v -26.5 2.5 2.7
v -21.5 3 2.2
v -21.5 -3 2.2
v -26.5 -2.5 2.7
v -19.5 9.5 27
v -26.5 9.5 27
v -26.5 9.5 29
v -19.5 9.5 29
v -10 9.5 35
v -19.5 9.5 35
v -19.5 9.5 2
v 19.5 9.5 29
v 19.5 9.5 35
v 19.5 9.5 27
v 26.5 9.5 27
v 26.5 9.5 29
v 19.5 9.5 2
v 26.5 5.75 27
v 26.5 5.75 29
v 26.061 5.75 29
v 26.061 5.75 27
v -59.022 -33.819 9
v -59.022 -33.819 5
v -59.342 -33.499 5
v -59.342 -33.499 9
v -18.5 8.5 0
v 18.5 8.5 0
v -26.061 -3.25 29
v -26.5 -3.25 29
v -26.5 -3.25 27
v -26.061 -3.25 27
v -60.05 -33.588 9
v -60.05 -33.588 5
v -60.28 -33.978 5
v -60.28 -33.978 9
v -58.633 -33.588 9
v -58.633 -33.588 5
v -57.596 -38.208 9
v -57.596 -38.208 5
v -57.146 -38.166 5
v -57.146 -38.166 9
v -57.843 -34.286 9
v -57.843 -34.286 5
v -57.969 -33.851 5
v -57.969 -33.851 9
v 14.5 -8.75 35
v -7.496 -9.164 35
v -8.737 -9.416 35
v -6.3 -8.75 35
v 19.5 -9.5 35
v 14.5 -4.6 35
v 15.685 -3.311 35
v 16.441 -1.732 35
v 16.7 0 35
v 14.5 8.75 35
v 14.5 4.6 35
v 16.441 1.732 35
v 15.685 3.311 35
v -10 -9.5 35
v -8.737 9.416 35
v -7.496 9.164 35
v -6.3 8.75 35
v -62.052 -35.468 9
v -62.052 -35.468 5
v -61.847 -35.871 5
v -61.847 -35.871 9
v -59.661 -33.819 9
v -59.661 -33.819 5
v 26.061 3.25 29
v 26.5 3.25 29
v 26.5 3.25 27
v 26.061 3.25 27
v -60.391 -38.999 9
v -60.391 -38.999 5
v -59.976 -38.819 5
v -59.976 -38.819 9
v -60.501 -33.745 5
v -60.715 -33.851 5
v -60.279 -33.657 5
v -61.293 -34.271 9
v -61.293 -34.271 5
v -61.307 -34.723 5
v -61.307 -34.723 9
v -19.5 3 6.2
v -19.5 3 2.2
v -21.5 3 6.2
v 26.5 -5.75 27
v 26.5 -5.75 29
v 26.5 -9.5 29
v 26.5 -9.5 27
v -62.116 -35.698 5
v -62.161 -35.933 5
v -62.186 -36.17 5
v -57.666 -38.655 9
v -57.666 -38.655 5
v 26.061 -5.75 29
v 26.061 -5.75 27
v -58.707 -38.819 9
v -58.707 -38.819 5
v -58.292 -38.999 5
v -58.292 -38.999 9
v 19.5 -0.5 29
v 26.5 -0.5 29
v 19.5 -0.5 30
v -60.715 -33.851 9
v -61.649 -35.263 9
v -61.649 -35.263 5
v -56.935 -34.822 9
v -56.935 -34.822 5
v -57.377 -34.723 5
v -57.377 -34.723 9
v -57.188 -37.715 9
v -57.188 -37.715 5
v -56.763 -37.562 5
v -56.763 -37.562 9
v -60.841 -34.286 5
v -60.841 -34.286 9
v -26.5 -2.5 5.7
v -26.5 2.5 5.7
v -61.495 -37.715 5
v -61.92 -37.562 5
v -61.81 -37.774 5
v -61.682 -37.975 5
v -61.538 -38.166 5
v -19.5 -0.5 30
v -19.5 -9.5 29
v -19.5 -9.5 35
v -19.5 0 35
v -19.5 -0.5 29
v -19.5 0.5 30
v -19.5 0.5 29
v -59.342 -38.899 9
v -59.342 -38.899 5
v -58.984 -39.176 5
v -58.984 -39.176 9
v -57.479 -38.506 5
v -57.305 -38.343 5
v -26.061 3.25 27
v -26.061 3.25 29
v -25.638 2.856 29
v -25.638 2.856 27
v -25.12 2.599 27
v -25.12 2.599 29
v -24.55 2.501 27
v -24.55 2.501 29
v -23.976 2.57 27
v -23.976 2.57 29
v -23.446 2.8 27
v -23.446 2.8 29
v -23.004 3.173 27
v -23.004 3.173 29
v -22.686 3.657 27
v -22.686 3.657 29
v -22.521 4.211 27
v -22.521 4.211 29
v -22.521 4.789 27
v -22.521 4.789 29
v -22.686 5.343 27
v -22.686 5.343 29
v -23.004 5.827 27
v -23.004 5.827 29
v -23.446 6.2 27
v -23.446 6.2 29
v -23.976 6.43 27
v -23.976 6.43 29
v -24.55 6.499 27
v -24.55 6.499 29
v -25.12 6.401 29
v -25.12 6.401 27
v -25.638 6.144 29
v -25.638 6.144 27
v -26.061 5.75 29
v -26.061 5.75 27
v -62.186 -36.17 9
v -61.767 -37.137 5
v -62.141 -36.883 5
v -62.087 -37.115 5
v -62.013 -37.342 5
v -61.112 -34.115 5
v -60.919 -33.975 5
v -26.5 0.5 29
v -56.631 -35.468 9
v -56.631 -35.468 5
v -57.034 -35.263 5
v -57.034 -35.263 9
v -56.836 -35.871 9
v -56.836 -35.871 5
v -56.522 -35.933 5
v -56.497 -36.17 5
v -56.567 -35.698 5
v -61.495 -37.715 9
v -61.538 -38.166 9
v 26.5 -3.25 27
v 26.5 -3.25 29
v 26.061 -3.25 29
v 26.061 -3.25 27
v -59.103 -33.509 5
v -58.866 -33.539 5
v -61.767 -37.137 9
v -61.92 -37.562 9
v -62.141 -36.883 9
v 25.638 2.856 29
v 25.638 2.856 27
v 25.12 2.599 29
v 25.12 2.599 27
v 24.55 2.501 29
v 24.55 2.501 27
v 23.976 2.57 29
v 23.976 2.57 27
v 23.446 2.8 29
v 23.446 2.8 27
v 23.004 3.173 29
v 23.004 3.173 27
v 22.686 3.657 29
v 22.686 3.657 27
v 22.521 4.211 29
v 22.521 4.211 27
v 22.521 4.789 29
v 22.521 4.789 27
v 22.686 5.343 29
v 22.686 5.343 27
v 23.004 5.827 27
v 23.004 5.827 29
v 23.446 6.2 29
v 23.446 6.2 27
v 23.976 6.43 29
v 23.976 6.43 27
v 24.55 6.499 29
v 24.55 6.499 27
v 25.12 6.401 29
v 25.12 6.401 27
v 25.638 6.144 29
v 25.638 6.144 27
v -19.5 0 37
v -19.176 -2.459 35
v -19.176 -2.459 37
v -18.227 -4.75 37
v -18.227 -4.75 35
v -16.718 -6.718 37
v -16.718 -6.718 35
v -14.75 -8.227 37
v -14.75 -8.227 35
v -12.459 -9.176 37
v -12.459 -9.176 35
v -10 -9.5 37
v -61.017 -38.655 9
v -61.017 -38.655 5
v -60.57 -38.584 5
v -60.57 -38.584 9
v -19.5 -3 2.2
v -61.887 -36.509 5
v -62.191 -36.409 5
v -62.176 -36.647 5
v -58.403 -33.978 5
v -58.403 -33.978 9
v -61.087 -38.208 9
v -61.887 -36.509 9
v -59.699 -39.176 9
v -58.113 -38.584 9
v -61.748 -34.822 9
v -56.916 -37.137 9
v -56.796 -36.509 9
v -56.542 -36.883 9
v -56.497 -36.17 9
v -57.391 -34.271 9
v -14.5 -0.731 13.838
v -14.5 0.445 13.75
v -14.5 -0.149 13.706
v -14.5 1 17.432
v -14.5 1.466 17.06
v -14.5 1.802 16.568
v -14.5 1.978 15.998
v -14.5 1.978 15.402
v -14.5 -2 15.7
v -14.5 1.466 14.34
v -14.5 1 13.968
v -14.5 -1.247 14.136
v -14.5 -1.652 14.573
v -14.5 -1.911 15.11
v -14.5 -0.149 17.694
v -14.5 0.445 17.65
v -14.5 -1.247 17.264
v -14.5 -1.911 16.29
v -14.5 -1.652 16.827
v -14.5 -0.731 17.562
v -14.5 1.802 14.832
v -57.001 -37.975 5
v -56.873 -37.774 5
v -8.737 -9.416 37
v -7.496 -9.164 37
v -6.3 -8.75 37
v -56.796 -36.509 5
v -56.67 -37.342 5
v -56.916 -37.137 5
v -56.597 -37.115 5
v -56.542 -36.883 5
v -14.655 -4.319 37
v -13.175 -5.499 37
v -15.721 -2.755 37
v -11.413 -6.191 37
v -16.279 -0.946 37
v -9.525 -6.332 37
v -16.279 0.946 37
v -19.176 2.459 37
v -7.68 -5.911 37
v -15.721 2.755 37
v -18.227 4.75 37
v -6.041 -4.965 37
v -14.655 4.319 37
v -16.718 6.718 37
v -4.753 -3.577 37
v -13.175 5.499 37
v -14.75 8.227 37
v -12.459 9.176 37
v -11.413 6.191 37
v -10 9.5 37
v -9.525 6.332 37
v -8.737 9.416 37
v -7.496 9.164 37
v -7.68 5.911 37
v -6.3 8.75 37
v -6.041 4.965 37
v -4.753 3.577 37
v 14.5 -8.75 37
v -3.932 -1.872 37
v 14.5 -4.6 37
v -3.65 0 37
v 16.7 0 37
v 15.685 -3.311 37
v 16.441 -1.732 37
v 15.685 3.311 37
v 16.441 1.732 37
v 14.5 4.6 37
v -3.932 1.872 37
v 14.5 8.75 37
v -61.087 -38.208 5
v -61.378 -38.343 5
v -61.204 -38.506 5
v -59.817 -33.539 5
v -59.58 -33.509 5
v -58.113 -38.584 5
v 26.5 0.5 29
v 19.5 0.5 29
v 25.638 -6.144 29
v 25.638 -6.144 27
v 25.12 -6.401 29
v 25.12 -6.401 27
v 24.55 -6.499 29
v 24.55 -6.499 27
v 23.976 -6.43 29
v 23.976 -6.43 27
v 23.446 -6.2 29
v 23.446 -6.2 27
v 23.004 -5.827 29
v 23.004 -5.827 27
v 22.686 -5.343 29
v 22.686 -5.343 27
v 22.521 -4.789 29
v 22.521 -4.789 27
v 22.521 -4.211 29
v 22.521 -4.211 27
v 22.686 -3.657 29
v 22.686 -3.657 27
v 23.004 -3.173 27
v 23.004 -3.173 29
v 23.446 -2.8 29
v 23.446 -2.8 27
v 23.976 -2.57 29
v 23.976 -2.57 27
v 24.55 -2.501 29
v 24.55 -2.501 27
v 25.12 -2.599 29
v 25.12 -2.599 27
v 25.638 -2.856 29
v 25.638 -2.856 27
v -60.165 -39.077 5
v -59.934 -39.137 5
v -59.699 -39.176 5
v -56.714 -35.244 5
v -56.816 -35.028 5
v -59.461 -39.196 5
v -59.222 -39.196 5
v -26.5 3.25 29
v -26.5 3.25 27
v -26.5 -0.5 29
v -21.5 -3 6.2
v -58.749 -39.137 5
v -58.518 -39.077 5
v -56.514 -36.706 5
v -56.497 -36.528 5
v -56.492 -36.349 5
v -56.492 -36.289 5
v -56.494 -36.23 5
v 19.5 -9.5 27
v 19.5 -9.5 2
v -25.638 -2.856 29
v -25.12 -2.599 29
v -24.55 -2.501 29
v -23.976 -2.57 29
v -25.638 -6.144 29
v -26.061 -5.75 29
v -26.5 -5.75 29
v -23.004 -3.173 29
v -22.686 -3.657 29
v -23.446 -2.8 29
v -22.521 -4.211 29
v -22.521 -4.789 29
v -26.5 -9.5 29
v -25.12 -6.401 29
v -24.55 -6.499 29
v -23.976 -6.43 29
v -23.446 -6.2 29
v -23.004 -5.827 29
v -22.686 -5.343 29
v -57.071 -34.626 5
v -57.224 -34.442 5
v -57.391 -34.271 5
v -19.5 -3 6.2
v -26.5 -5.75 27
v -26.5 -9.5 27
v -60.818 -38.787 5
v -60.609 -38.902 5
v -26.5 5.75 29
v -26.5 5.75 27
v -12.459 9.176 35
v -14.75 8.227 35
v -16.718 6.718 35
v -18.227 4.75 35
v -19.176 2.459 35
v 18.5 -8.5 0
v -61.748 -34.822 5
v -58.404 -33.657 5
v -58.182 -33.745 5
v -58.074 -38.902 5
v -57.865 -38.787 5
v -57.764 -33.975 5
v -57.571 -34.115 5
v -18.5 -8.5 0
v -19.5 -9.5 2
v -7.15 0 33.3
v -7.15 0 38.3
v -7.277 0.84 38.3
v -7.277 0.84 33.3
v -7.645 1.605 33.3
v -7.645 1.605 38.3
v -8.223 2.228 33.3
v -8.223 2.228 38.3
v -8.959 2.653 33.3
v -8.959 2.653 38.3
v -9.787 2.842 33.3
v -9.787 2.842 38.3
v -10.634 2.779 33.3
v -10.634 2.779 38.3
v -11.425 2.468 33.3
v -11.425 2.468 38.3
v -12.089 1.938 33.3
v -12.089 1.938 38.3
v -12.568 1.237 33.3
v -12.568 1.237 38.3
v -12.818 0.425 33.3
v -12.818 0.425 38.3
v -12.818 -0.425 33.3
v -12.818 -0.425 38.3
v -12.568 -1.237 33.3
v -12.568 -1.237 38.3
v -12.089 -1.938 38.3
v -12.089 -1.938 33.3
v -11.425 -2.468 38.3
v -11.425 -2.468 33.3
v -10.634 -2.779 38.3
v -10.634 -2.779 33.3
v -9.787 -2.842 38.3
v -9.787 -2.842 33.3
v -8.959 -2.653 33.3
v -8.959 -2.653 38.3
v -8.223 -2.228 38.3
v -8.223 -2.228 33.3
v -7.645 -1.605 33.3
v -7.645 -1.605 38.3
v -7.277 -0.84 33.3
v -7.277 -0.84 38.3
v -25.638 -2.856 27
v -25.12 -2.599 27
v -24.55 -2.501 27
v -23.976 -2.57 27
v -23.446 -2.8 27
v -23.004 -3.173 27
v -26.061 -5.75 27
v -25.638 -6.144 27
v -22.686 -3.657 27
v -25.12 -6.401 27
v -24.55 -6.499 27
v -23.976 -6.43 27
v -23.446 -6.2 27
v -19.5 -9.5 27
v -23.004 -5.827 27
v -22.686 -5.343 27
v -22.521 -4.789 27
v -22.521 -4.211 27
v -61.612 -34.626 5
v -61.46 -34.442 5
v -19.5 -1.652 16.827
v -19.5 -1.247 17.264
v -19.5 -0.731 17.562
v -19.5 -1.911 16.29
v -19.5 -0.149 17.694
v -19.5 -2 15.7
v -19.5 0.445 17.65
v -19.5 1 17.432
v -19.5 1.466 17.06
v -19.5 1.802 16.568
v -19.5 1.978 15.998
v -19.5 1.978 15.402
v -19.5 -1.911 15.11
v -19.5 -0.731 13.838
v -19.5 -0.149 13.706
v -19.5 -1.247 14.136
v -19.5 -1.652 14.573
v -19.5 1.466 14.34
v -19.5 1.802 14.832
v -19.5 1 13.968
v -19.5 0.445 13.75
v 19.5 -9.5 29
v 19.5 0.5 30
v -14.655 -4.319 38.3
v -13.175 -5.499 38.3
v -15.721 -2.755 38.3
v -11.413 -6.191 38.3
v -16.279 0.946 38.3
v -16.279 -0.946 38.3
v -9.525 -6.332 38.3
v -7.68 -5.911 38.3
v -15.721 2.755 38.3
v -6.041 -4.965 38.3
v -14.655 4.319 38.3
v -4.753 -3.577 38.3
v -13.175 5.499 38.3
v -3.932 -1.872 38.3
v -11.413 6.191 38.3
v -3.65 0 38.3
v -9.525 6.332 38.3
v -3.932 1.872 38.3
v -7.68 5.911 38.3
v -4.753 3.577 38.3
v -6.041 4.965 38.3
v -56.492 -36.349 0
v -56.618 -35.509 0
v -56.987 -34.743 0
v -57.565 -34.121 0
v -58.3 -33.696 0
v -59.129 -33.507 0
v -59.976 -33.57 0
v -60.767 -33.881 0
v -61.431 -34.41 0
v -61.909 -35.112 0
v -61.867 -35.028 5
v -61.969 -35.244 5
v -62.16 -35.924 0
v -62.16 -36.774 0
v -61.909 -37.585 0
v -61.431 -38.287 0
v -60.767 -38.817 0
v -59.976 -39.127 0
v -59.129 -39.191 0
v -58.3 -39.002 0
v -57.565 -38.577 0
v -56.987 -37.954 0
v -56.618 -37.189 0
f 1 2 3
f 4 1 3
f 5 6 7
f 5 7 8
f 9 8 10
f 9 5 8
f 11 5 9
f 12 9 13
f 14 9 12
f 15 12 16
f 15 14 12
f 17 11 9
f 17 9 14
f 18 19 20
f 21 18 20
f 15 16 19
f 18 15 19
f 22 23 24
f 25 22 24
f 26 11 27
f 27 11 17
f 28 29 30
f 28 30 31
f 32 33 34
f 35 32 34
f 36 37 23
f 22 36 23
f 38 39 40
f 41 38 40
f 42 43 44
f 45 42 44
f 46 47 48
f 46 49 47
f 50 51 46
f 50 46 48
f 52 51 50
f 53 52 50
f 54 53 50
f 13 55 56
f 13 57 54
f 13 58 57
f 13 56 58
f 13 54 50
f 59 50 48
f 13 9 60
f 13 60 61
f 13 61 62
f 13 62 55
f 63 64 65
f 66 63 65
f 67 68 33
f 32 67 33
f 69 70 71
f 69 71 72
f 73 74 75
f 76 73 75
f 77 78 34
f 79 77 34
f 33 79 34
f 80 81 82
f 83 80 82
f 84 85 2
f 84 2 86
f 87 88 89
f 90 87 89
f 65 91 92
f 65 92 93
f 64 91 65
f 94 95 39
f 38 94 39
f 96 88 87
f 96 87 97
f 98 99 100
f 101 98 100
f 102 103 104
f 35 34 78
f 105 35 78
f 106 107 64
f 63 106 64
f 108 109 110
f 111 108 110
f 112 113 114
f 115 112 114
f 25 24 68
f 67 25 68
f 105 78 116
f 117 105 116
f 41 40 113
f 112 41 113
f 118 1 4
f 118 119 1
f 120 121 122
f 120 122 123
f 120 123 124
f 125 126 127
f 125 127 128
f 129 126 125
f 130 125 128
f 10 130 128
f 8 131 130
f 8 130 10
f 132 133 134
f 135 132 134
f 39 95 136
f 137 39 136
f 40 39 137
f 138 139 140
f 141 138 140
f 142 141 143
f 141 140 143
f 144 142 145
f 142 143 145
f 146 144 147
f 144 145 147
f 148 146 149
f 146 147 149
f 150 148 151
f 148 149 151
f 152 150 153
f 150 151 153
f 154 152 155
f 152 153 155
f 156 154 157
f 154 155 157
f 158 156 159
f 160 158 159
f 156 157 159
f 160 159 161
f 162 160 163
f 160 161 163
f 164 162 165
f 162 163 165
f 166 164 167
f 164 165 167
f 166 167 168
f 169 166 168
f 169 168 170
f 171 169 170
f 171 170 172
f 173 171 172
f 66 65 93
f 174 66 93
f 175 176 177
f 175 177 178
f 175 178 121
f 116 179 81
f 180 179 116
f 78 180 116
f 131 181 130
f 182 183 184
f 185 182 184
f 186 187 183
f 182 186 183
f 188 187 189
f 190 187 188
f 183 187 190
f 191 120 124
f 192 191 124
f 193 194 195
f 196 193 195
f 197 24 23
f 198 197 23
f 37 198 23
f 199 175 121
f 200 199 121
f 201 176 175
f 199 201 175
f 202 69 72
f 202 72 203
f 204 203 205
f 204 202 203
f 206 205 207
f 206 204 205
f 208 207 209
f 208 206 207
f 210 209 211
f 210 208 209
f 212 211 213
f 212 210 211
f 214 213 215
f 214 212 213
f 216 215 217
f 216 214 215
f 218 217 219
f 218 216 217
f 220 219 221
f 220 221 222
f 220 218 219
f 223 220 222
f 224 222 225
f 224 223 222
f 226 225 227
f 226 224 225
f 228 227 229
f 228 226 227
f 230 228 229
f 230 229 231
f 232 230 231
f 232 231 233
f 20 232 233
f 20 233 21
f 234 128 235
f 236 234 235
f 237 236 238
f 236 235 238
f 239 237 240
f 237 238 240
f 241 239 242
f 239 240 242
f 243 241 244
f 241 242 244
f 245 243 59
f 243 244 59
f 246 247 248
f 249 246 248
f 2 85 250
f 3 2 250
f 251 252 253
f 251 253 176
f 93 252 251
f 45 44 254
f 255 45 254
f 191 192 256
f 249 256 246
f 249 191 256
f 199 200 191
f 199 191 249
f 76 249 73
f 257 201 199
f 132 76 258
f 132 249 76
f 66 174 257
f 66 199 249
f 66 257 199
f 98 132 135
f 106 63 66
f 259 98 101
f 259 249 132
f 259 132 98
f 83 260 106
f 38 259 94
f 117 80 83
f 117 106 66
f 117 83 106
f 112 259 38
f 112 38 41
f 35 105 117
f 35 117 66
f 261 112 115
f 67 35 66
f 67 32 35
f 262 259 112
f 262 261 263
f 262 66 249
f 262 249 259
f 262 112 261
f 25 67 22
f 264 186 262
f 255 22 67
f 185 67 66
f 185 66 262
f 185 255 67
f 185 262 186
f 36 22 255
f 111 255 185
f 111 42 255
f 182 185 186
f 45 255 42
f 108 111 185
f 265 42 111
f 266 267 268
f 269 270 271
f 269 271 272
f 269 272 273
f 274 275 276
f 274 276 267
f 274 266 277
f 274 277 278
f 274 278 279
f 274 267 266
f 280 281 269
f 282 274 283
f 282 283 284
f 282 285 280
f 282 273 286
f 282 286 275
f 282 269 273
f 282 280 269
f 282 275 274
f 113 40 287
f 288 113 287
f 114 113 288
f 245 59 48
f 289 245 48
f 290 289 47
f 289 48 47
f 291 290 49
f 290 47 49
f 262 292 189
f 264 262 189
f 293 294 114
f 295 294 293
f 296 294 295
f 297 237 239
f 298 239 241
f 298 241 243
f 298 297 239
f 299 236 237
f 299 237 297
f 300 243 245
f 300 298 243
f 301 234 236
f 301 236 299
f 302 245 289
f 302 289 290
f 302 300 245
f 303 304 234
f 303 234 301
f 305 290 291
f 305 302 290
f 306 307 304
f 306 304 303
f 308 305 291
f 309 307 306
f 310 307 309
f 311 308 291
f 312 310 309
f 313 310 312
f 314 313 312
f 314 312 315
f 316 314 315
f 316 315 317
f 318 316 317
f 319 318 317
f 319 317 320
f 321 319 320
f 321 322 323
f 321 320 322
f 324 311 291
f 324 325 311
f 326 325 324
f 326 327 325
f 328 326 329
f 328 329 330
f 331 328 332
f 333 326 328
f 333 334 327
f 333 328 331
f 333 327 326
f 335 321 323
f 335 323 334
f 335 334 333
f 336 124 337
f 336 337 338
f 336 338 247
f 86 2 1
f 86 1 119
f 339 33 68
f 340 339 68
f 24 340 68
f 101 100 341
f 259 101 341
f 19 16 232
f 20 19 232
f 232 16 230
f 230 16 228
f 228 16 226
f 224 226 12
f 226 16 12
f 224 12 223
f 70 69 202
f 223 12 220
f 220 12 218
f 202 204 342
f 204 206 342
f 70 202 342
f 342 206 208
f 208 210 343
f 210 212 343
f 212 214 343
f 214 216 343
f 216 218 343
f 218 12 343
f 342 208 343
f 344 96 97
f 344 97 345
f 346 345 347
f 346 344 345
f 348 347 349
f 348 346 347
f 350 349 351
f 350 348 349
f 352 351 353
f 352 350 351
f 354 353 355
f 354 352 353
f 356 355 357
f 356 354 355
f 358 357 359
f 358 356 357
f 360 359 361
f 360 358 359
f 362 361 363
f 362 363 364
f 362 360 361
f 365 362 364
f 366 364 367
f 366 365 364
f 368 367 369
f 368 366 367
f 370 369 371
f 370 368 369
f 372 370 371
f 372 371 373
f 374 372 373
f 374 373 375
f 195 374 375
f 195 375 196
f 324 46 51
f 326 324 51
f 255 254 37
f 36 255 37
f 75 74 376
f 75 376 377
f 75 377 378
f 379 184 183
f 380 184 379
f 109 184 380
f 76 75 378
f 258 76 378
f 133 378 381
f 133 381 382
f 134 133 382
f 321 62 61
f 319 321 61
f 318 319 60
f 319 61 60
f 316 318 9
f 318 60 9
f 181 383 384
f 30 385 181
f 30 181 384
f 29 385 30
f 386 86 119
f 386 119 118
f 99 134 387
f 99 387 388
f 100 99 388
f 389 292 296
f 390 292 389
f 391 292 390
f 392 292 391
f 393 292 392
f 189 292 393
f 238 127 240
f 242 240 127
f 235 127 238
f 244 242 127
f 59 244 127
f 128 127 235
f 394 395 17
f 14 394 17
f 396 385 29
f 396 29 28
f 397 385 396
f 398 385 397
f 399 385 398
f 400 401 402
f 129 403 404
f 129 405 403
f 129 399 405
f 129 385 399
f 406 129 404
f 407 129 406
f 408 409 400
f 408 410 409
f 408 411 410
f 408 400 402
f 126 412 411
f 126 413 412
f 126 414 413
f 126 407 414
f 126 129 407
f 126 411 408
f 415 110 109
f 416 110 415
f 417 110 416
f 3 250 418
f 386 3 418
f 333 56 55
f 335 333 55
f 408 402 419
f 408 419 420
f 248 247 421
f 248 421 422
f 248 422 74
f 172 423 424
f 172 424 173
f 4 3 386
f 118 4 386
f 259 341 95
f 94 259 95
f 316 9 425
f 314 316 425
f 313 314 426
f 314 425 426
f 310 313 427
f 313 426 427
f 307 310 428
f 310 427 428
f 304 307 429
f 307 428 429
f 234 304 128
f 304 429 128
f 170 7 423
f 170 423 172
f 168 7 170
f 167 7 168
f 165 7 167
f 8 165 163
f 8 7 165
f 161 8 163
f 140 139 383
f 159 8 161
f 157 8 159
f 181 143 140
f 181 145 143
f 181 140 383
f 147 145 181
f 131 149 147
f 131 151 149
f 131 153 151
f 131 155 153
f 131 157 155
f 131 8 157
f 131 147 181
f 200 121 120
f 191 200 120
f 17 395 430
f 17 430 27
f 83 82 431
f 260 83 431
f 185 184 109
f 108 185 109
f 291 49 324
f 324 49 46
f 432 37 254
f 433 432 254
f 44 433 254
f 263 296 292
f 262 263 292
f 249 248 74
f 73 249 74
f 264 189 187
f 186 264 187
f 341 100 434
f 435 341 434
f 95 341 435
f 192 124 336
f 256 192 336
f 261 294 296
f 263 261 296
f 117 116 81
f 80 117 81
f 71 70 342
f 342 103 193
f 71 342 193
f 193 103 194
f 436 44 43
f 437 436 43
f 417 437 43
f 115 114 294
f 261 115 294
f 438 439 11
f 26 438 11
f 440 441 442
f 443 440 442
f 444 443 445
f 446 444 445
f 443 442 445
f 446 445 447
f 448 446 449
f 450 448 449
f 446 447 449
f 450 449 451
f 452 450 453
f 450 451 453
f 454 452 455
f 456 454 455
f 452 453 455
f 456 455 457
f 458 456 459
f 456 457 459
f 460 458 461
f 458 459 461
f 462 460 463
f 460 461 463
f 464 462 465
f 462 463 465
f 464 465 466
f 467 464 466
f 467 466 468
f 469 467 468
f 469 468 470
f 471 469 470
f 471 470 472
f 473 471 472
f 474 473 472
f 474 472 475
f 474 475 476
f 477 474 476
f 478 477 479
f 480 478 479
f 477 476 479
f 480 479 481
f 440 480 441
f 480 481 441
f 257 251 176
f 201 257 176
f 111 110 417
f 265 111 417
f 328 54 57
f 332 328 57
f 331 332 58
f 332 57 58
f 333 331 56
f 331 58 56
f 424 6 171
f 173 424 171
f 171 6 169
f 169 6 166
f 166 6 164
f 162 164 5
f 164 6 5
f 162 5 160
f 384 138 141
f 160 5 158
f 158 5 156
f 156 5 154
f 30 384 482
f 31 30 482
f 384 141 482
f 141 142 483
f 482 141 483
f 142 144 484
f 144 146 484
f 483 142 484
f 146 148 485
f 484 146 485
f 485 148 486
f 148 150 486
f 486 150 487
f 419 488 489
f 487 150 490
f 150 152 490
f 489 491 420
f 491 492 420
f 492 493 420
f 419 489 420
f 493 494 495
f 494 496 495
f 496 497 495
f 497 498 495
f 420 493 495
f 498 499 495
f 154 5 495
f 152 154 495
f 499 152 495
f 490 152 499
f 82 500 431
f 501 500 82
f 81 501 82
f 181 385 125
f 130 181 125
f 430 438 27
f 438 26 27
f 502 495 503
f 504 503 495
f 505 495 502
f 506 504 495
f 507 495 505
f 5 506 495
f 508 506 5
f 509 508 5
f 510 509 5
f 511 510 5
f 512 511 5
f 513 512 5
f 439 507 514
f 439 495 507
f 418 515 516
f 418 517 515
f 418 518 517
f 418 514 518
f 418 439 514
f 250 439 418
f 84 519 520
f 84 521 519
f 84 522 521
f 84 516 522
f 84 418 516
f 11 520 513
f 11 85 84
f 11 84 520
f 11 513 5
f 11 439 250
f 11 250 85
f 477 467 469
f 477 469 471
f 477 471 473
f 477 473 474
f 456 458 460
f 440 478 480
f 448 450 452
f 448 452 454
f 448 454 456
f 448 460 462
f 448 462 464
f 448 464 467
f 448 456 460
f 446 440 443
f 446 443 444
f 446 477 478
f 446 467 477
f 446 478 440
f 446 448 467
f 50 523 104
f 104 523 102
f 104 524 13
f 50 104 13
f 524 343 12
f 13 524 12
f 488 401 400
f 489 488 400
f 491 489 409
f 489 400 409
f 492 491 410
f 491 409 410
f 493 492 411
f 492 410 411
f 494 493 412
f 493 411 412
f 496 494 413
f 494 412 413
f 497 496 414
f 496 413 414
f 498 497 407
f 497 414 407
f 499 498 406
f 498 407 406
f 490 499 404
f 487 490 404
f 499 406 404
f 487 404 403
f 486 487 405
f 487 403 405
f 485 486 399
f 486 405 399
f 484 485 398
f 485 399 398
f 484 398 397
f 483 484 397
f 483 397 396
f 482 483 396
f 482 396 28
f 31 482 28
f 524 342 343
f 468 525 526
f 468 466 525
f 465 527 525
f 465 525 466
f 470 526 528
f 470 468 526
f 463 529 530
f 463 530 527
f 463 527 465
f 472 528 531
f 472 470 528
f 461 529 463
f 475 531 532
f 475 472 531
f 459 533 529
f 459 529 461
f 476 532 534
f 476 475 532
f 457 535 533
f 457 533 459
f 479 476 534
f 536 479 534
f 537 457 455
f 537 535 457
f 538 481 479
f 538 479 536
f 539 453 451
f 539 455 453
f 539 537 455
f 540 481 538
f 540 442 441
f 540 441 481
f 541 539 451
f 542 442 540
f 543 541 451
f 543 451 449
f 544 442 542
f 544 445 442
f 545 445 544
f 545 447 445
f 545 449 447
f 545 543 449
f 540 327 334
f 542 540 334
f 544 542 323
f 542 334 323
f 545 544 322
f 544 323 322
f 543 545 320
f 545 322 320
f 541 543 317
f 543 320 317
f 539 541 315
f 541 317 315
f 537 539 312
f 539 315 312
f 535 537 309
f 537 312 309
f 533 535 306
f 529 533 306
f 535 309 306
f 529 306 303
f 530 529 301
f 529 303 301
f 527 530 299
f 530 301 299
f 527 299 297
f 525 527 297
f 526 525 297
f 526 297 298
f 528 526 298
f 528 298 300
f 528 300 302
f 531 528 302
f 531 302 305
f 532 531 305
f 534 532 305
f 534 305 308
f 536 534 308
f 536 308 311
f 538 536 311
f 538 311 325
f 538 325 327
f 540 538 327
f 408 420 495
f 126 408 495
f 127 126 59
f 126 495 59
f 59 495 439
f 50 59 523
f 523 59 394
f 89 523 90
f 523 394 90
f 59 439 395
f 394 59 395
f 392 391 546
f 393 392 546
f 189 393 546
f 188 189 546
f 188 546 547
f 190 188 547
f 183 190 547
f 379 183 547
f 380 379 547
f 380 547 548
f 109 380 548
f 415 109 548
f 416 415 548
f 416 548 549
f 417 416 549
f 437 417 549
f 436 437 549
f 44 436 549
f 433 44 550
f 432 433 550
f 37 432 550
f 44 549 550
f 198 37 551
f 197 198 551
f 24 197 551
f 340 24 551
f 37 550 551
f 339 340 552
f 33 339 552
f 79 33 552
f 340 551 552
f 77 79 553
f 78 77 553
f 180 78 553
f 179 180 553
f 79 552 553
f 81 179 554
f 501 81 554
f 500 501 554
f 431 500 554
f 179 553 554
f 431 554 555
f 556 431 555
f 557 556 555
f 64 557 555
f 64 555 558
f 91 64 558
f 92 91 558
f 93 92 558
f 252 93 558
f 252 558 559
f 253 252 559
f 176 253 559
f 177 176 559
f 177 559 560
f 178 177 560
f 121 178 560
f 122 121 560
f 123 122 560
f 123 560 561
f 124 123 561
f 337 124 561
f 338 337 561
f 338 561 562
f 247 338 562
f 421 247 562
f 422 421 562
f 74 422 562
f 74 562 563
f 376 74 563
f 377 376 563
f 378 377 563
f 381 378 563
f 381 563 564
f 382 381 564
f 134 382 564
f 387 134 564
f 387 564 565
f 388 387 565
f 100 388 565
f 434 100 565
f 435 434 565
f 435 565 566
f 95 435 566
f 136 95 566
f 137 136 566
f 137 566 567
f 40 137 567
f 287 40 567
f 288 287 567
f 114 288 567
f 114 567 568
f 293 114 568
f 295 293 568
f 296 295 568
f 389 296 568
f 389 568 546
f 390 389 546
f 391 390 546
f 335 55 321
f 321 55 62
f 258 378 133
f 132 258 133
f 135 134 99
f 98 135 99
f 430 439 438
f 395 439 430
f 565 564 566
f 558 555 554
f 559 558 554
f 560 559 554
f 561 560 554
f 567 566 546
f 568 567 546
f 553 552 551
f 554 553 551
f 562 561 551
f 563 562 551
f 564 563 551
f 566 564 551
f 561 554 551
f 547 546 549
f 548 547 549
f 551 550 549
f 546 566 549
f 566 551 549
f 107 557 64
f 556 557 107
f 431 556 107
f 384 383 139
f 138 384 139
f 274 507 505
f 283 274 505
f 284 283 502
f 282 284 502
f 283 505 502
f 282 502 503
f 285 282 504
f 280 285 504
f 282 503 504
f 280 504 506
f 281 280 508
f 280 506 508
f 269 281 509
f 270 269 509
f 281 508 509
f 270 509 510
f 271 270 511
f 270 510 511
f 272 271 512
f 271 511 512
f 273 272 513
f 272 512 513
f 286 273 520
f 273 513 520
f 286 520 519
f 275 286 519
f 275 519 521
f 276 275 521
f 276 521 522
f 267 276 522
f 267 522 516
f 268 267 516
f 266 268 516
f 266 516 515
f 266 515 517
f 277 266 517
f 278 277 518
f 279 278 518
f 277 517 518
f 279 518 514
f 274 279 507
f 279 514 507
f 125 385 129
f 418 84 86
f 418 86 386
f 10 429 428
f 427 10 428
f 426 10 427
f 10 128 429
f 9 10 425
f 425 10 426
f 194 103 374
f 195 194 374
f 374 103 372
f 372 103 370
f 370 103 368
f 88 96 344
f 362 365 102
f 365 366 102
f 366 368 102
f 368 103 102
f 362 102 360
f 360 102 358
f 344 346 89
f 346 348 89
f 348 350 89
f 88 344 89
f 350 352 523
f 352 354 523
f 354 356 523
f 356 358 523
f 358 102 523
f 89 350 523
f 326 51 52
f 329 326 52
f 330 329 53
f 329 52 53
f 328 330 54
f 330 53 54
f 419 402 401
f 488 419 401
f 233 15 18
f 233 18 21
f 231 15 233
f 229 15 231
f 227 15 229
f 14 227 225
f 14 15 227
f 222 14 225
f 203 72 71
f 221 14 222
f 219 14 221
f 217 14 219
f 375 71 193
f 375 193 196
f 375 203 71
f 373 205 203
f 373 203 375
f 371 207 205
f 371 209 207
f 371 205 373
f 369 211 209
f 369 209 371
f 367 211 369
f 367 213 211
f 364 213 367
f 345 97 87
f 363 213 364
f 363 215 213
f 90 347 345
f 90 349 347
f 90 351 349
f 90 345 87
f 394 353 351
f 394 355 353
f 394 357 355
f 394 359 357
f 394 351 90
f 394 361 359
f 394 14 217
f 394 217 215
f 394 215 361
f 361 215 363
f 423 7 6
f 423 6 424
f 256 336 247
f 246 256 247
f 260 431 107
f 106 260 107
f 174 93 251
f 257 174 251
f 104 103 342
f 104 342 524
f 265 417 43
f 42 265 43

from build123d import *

# Parameters (mm, degrees)
F0_W      = 39
F0_H      = 19
F1_DEPTH  = 35
F2_W      = 19
F2_H      = 2
F3_DEPTH  = 7
F4_W      = 7
F4_H      = 1
F5_DEPTH  = 1
F7_DEPTH  = 1
F8_SIZE2  = 2
F8_SIZE   = 1
F9_W      = 0.5
F9_H      = 2.5
F9_W_2    = 0.4387505004
F10_DEPTH = 2
F12_W     = 6
F12_H     = 4
F13_DEPTH = 7
F12_R     = 2
F14_DEPTH = 5
F15_SIZE2 = 5
F15_SIZE  = 0.5
F16_R     = 6.35
F17_DEPTH = 2
F18_DEPTH = 3.3
F19_R     = 2.85
F20_DEPTH = 5
F21_R     = 2.85
F22_DEPTH = 5
F24_DEPTH = 4


with BuildPart() as f1:
    # F0 (on Top) → F1 (new body)
    with BuildSketch(Plane.XY):
        Rectangle(F0_W, F0_H)
    extrude(amount=F1_DEPTH)

    # F2 (on face) → F3 (join)
    with BuildSketch(Plane(origin=(-19.5, 0, 0), x_dir=(0, -1, 0), z_dir=(-1, 0, 0))):
        with Locations((0, 28)):
            Rectangle(F2_W, F2_H)
    extrude(amount=F3_DEPTH)

    # F4 (on face) → F5 (join)
    with BuildSketch(Plane.XY.offset(29)):
        with Locations((-23, 0)):
            Rectangle(F4_W, F4_H)
    extrude(amount=F5_DEPTH)

    # F6 (on face) → F7 (cut, through all)
    with BuildSketch(Plane.XZ.offset(0.5)):
        Polygon((-26.5, 30), (-26.5, 29), (-19.5, 30), align=None)
    extrude(amount=-F7_DEPTH, mode=Mode.SUBTRACT)

    # F8
    f8_edges = [f1.edges().sort_by_distance(p)[0] for p in [
        (0, -9.5, 0),
        (19.5, 0, 0),
        (0, 9.5, 0),
        (-19.5, 0, 0),
    ]]
    f8_side = f1.faces().sort_by_distance((0, 0, 0))[0]
    chamfer(f8_edges, length=F8_SIZE, length2=F8_SIZE2, reference=f8_side)

    # F9 (on face) → F10 (cut, through all)
    with BuildSketch(Plane.XY.offset(29)):
        with Locations((-26.3112494996, 4.5)):
            Rectangle(F9_W, F9_H)
        with BuildLine():
            Line((-26.0612494996, 5.75), (-26.0612494996, 3.25))
            ThreePointArc((-26.0612494996, 3.25), (-22.5, 4.5), (-26.0612494996, 5.75))
        make_face()
        with Locations((-26.2806247498, -4.5)):
            Rectangle(F9_W_2, F9_H)
        with BuildLine():
            Line((-26.0612494996, -3.25), (-26.0612494996, -5.75))
            ThreePointArc((-26.0612494996, -5.75), (-22.5, -4.5), (-26.0612494996, -3.25))
        make_face()
    extrude(amount=-F10_DEPTH, mode=Mode.SUBTRACT)

    # F11: F1 across plane


with BuildPart() as f1_1:
    add(f1.part)
    add(f1.part.mirror(Plane.YZ))

    # F12 (on face) → F13 (join)
    with BuildSketch(Plane(origin=(-19.5, 0, 0), x_dir=(0, -1, 0), z_dir=(-1, 0, 0))):
        with Locations((0, 4.2)):
            Rectangle(F12_W, F12_H)
    extrude(amount=F13_DEPTH)

    # F12 (on face) → F14 (cut)
    with BuildSketch(Plane(origin=(-19.5, 0, 0), x_dir=(0, -1, 0), z_dir=(-1, 0, 0))):
        with Locations((0, 15.7)):
            Circle(F12_R)
    extrude(amount=-F14_DEPTH, mode=Mode.SUBTRACT)

    # F15
    f15_edges = [f1_1.edges().sort_by_distance(p)[0] for p in [
        (-26.5, 0, 2.2),
        (-26.5, -3, 4.2),
        (-26.5, 0, 6.2),
        (-26.5, 3, 4.2),
    ]]
    f15_side = f1_1.faces().sort_by_distance((-26.5, 0, 4.2))[0]
    chamfer(f15_edges, length=F15_SIZE, length2=F15_SIZE2, reference=f15_side)

    # F16 (on face) → F17 (join)
    with BuildSketch(Plane.XY.offset(35)):
        with BuildLine():
            ThreePointArc((-6.3003378533, -8.75), (-2.0817681774, -5.2489622596), (-0.5, 0))
            ThreePointArc((-0.5, 0), (-2.0817681774, 5.2489622596), (-6.3003378533, 8.75))
            ThreePointArc((-6.3003378533, 8.75), (-8.1125413912, 9.3106122248), (-10, 9.5))
            ThreePointArc((-10, 9.5), (-16.7175144213, 6.7175144213), (-19.5, 0))
            ThreePointArc((-19.5, 0), (-16.7175144213, -6.7175144213), (-10, -9.5))
            ThreePointArc((-10, -9.5), (-8.1125413912, -9.3106122248), (-6.3003378533, -8.75))
        make_face()
        with Locations((-10, 0)):
            Circle(F16_R, mode=Mode.SUBTRACT)
        with BuildLine():
            ThreePointArc((-6.3003378533, 8.75), (-2.0817681774, 5.2489622596), (-0.5, 0))
            ThreePointArc((-0.5, 0), (-2.0817681774, -5.2489622596), (-6.3003378533, -8.75))
            Line((-6.3003378533, -8.75), (14.5, -8.75))
            Line((14.5, -8.75), (14.5, -4.6))
            ThreePointArc((14.5, -4.6), (4.8818181818, 0), (14.5, 4.6))
            Line((14.5, 4.6), (14.5, 8.75))
            Line((14.5, 8.75), (-6.3003378533, 8.75))
        make_face()
        with BuildLine():
            Line((14.5, -4.6), (14.5, 4.6))
            ThreePointArc((14.5, 4.6), (4.8818181818, 0), (14.5, -4.6))
        make_face()
        with BuildLine():
            ThreePointArc((16.7, 0), (16.1217022188, 2.5495097568), (14.5, 4.6))
            Line((14.5, 4.6), (14.5, -4.6))
            ThreePointArc((14.5, -4.6), (16.1217022188, -2.5495097568), (16.7, 0))
        make_face()
    extrude(amount=F17_DEPTH)

    # F18 (add): a face of the model
    f18_faces = [f1_1.faces().sort_by_distance(p)[0] for p in [
        (-10, 0, 35),
    ]]
    extrude(f18_faces, amount=F18_DEPTH)

    # F19 (on face) → F20 (cut)
    with BuildSketch(Plane.XY.offset(38.3)):
        with Locations((-10, 0)):
            Circle(F19_R)
    extrude(amount=-F20_DEPTH, mode=Mode.SUBTRACT)


with BuildPart() as f22:
    # F21 (on Top) → F22 (new body)
    with BuildSketch(Plane.XY):
        with Locations((-59.341583401, -36.3488905132)):
            Circle(F21_R)
    extrude(amount=F22_DEPTH)

    # F23 (on face) → F24 (join)
    with BuildSketch(Plane.XY.offset(5)):
        Polygon((-60.7145813722, -33.8514164751), (-60.8406198108, -34.2856439005), (-61.2925426529, -34.271329925), (-61.3066333928, -34.7232597825), (-61.7479179886, -34.8217841475), (-61.6491756568, -35.263020022), (-62.0520944724, -35.4681920792), (-61.8467234126, -35.871009498), (-62.185959577, -36.1699375325), (-61.8868640083, -36.5090259957), (-62.1411020655, -36.8829272598), (-61.7670752625, -37.136980592), (-61.9203405005, -37.5623614941), (-61.4948839427, -37.7154165904), (-61.5375461429, -38.165548884), (-61.0873928306, -38.2079887296), (-61.01677137, -38.6545889472), (-60.5702060914, -38.5837468905), (-60.3907383761, -38.998753498), (-59.97582047, -38.8190808061), (-59.6987831166, -39.1764174119), (-59.341583401, -38.8992035808), (-58.9843836853, -39.1764174119), (-58.707346332, -38.8190808061), (-58.2924284258, -38.998753498), (-58.1129607105, -38.5837468905), (-57.6663954319, -38.6545889472), (-57.5957739713, -38.2079887296), (-57.1456206591, -38.165548884), (-57.1882828592, -37.7154165904), (-56.7628263014, -37.5623614941), (-56.9160915394, -37.136980592), (-56.5420647364, -36.8829272598), (-56.7963027937, -36.5090259957), (-56.4972072249, -36.1699375325), (-56.8364433893, -35.871009498), (-56.6310723295, -35.4681920792), (-57.0339911452, -35.263020022), (-56.9352488133, -34.8217841475), (-57.3765334092, -34.7232597825), (-57.3906241491, -34.271329925), (-57.8425469911, -34.2856439005), (-57.9685854298, -33.8514164751), (-58.4027505438, -33.9776693913), (-58.6328172225, -33.588428504), (-59.0219444176, -33.8186874259), (-59.341583401, -33.4988905132), (-59.6612223843, -33.8186874259), (-60.0503495794, -33.588428504), (-60.2804162582, -33.9776693913), align=None)
        with BuildLine():
            Line((-61.0868844044, -38.2080366633), (-61.0873928306, -38.2079887296))
            Line((-61.0873928306, -38.2079887296), (-61.0874725941, -38.2074843164))
            ThreePointArc((-61.0874725941, -38.2074843164), (-61.0871785211, -38.2077605131), (-61.0868844044, -38.2080366633))
        make_face(mode=Mode.SUBTRACT)
        with BuildLine():
            Line((-60.5697017177, -38.5836668779), (-60.5702060914, -38.5837468905))
            Line((-60.5702060914, -38.5837468905), (-60.5704087914, -38.5832781608))
            ThreePointArc((-60.5704087914, -38.5832781608), (-60.5700552699, -38.5834725473), (-60.5697017177, -38.5836668779))
        make_face(mode=Mode.SUBTRACT)
        with BuildLine():
            Line((-59.9753518404, -38.8188778745), (-59.97582047, -38.8190808061))
            Line((-59.97582047, -38.8190808061), (-59.9761333702, -38.8186772118))
            ThreePointArc((-59.9761333702, -38.8186772118), (-59.9757426132, -38.8187775741), (-59.9753518404, -38.8188778745))
        make_face(mode=Mode.SUBTRACT)
        with BuildLine():
            Line((-61.4944034103, -37.7155894586), (-61.4948839427, -37.7154165904))
            Line((-61.4948839427, -37.7154165904), (-61.4948357578, -37.7149081879))
            ThreePointArc((-61.4948357578, -37.7149081879), (-61.494619611, -37.7152488404), (-61.4944034103, -37.7155894586))
        make_face(mode=Mode.SUBTRACT)
        with BuildLine():
            Line((-61.7666528175, -37.1372675329), (-61.7670752625, -37.136980592))
            Line((-61.7670752625, -37.136980592), (-61.7669021569, -37.1365001451))
            ThreePointArc((-61.7669021569, -37.1365001451), (-61.7667775175, -37.1368838488), (-61.7666528175, -37.1372675329))
        make_face(mode=Mode.SUBTRACT)
        with BuildLine():
            Line((-61.8865261944, -36.5094089795), (-61.8868640083, -36.5090259957))
            Line((-61.8868640083, -36.5090259957), (-61.8865768588, -36.5086036924))
            ThreePointArc((-61.8865768588, -36.5086036924), (-61.8865515585, -36.509006338), (-61.8865261944, -36.5094089795))
        make_face(mode=Mode.SUBTRACT)
        with BuildLine():
            Line((-59.3411799613, -38.8988904813), (-59.341583401, -38.8992035808))
            Line((-59.341583401, -38.8992035808), (-59.3419868406, -38.8988904813))
            ThreePointArc((-59.3419868406, -38.8988904813), (-59.341583401, -38.8988905132), (-59.3411799613, -38.8988904813))
        make_face(mode=Mode.SUBTRACT)
        with BuildLine():
            Line((-58.7070334318, -38.8186772118), (-58.707346332, -38.8190808061))
            Line((-58.707346332, -38.8190808061), (-58.7078149615, -38.8188778745))
            ThreePointArc((-58.7078149615, -38.8188778745), (-58.7074241887, -38.8187775741), (-58.7070334318, -38.8186772118))
        make_face(mode=Mode.SUBTRACT)
        with BuildLine():
            Line((-58.1127580105, -38.5832781608), (-58.1129607105, -38.5837468905))
            Line((-58.1129607105, -38.5837468905), (-58.1134650842, -38.5836668779))
            ThreePointArc((-58.1134650842, -38.5836668779), (-58.113111532, -38.5834725473), (-58.1127580105, -38.5832781608))
        make_face(mode=Mode.SUBTRACT)
        with BuildLine():
            Line((-57.5956942078, -38.2074843164), (-57.5957739713, -38.2079887296))
            Line((-57.5957739713, -38.2079887296), (-57.5962823975, -38.2080366633))
            ThreePointArc((-57.5962823975, -38.2080366633), (-57.5959882808, -38.2077605131), (-57.5956942078, -38.2074843164))
        make_face(mode=Mode.SUBTRACT)
        with BuildLine():
            Line((-57.1883310441, -37.7149081879), (-57.1882828592, -37.7154165904))
            Line((-57.1882828592, -37.7154165904), (-57.1887633917, -37.7155894586))
            ThreePointArc((-57.1887633917, -37.7155894586), (-57.1885471909, -37.7152488404), (-57.1883310441, -37.7149081879))
        make_face(mode=Mode.SUBTRACT)
        with BuildLine():
            Line((-56.9162646451, -37.1365001451), (-56.9160915394, -37.136980592))
            Line((-56.9160915394, -37.136980592), (-56.9165139845, -37.1372675329))
            ThreePointArc((-56.9165139845, -37.1372675329), (-56.9163892844, -37.1368838488), (-56.9162646451, -37.1365001451))
        make_face(mode=Mode.SUBTRACT)
        with BuildLine():
            Line((-56.7965899431, -36.5086036924), (-56.7963027937, -36.5090259957))
            Line((-56.7963027937, -36.5090259957), (-56.7966406075, -36.5094089795))
            ThreePointArc((-56.7966406075, -36.5094089795), (-56.7966152435, -36.509006338), (-56.7965899431, -36.5086036924))
        make_face(mode=Mode.SUBTRACT)
        with BuildLine():
            Line((-61.846491456, -35.8714644606), (-61.8467234126, -35.871009498))
            Line((-61.8467234126, -35.871009498), (-61.8463402619, -35.8706718733))
            ThreePointArc((-61.8463402619, -35.8706718733), (-61.8464158903, -35.871068161), (-61.846491456, -35.8714644606))
        make_face(mode=Mode.SUBTRACT)
        with BuildLine():
            Line((-61.6490641321, -35.2635183764), (-61.6491756568, -35.263020022))
            Line((-61.6491756568, -35.263020022), (-61.6487205796, -35.2627882902))
            ThreePointArc((-61.6487205796, -35.2627882902), (-61.6488923848, -35.2631533197), (-61.6490641321, -35.2635183764))
        make_face(mode=Mode.SUBTRACT)
        with BuildLine():
            Line((-61.3066493076, -34.7237702153), (-61.3066333928, -34.7232597825))
            Line((-61.3066333928, -34.7232597825), (-61.3061349833, -34.7231485041))
            ThreePointArc((-61.3061349833, -34.7231485041), (-61.30639217, -34.7234593393), (-61.3066493076, -34.7237702153))
        make_face(mode=Mode.SUBTRACT)
        with BuildLine():
            Line((-60.8406198108, -34.2856439005), (-60.840109386, -34.2856600675))
            ThreePointArc((-60.840109386, -34.2856600675), (-60.8404357943, -34.2858971775), (-60.8407621651, -34.2861343392))
            Line((-60.8407621651, -34.2861343392), (-60.8406198108, -34.2856439005))
        make_face(mode=Mode.SUBTRACT)
        with BuildLine():
            Line((-60.2806761073, -33.9781090199), (-60.2804162582, -33.9776693913))
            Line((-60.2804162582, -33.9776693913), (-60.2799258899, -33.9778119878))
            ThreePointArc((-60.2799258899, -33.9778119878), (-60.2803010103, -33.9779604742), (-60.2806761073, -33.9781090199))
        make_face(mode=Mode.SUBTRACT)
        with BuildLine():
            Line((-56.83682654, -35.8706718733), (-56.8364433893, -35.871009498))
            Line((-56.8364433893, -35.871009498), (-56.8366753459, -35.8714644606))
            ThreePointArc((-56.8366753459, -35.8714644606), (-56.8367509116, -35.871068161), (-56.83682654, -35.8706718733))
        make_face(mode=Mode.SUBTRACT)
        with BuildLine():
            Line((-57.0344462223, -35.2627882902), (-57.0339911452, -35.263020022))
            Line((-57.0339911452, -35.263020022), (-57.0341026698, -35.2635183764))
            ThreePointArc((-57.0341026698, -35.2635183764), (-57.0342744172, -35.2631533197), (-57.0344462223, -35.2627882902))
        make_face(mode=Mode.SUBTRACT)
        with BuildLine():
            Line((-59.0223839178, -33.8189474921), (-59.0219444176, -33.8186874259))
            Line((-59.0219444176, -33.8186874259), (-59.021583401, -33.8190486209))
            ThreePointArc((-59.021583401, -33.8190486209), (-59.0219836554, -33.8189980248), (-59.0223839178, -33.8189474921))
        make_face(mode=Mode.SUBTRACT)
        with BuildLine():
            Line((-57.3770318186, -34.7231485041), (-57.3765334092, -34.7232597825))
            Line((-57.3765334092, -34.7232597825), (-57.3765174944, -34.7237702153))
            ThreePointArc((-57.3765174944, -34.7237702153), (-57.3767746319, -34.7234593393), (-57.3770318186, -34.7231485041))
        make_face(mode=Mode.SUBTRACT)
        with BuildLine():
            Line((-57.8430574159, -34.2856600675), (-57.8425469911, -34.2856439005))
            Line((-57.8425469911, -34.2856439005), (-57.8424046368, -34.2861343392))
            ThreePointArc((-57.8424046368, -34.2861343392), (-57.8427310076, -34.2858971775), (-57.8430574159, -34.2856600675))
        make_face(mode=Mode.SUBTRACT)
        with BuildLine():
            Line((-61.3061349833, -34.7231485041), (-61.3066333928, -34.7232597825))
            Line((-61.3066333928, -34.7232597825), (-61.3066493076, -34.7237702153))
            ThreePointArc((-61.3066493076, -34.7237702153), (-61.30639217, -34.7234593393), (-61.3061349833, -34.7231485041))
        make_face()
        with BuildLine():
            Line((-61.6487205796, -35.2627882902), (-61.6491756568, -35.263020022))
            Line((-61.6491756568, -35.263020022), (-61.6490641321, -35.2635183764))
            ThreePointArc((-61.6490641321, -35.2635183764), (-61.6488923848, -35.2631533197), (-61.6487205796, -35.2627882902))
        make_face()
        with BuildLine():
            Line((-61.8463402619, -35.8706718733), (-61.8467234126, -35.871009498))
            Line((-61.8467234126, -35.871009498), (-61.846491456, -35.8714644606))
            ThreePointArc((-61.846491456, -35.8714644606), (-61.8464158903, -35.871068161), (-61.8463402619, -35.8706718733))
        make_face()
        with BuildLine():
            Line((-61.8865768588, -36.5086036924), (-61.8868640083, -36.5090259957))
            Line((-61.8868640083, -36.5090259957), (-61.8865261944, -36.5094089795))
            ThreePointArc((-61.8865261944, -36.5094089795), (-61.8865515585, -36.509006338), (-61.8865768588, -36.5086036924))
        make_face()
        with BuildLine():
            Line((-61.7669021569, -37.1365001451), (-61.7670752625, -37.136980592))
            Line((-61.7670752625, -37.136980592), (-61.7666528175, -37.1372675329))
            ThreePointArc((-61.7666528175, -37.1372675329), (-61.7667775175, -37.1368838488), (-61.7669021569, -37.1365001451))
        make_face()
        with BuildLine():
            Line((-61.4948357578, -37.7149081879), (-61.4948839427, -37.7154165904))
            Line((-61.4948839427, -37.7154165904), (-61.4944034103, -37.7155894586))
            ThreePointArc((-61.4944034103, -37.7155894586), (-61.494619611, -37.7152488404), (-61.4948357578, -37.7149081879))
        make_face()
        with BuildLine():
            Line((-61.0874725941, -38.2074843164), (-61.0873928306, -38.2079887296))
            Line((-61.0873928306, -38.2079887296), (-61.0868844044, -38.2080366633))
            ThreePointArc((-61.0868844044, -38.2080366633), (-61.0871785211, -38.2077605131), (-61.0874725941, -38.2074843164))
        make_face()
        with BuildLine():
            Line((-60.5704087914, -38.5832781608), (-60.5702060914, -38.5837468905))
            Line((-60.5702060914, -38.5837468905), (-60.5697017177, -38.5836668779))
            ThreePointArc((-60.5697017177, -38.5836668779), (-60.5700552699, -38.5834725473), (-60.5704087914, -38.5832781608))
        make_face()
        with BuildLine():
            Line((-59.9761333702, -38.8186772118), (-59.97582047, -38.8190808061))
            Line((-59.97582047, -38.8190808061), (-59.9753518404, -38.8188778745))
            ThreePointArc((-59.9753518404, -38.8188778745), (-59.9757426132, -38.8187775741), (-59.9761333702, -38.8186772118))
        make_face()
        with BuildLine():
            Line((-59.3419868406, -38.8988904813), (-59.341583401, -38.8992035808))
            Line((-59.341583401, -38.8992035808), (-59.3411799613, -38.8988904813))
            ThreePointArc((-59.3411799613, -38.8988904813), (-59.341583401, -38.8988905132), (-59.3419868406, -38.8988904813))
        make_face()
        with BuildLine():
            Line((-58.7078149615, -38.8188778745), (-58.707346332, -38.8190808061))
            Line((-58.707346332, -38.8190808061), (-58.7070334318, -38.8186772118))
            ThreePointArc((-58.7070334318, -38.8186772118), (-58.7074241887, -38.8187775741), (-58.7078149615, -38.8188778745))
        make_face()
        with BuildLine():
            Line((-58.1134650842, -38.5836668779), (-58.1129607105, -38.5837468905))
            Line((-58.1129607105, -38.5837468905), (-58.1127580105, -38.5832781608))
            ThreePointArc((-58.1127580105, -38.5832781608), (-58.113111532, -38.5834725473), (-58.1134650842, -38.5836668779))
        make_face()
        with BuildLine():
            Line((-57.5962823975, -38.2080366633), (-57.5957739713, -38.2079887296))
            Line((-57.5957739713, -38.2079887296), (-57.5956942078, -38.2074843164))
            ThreePointArc((-57.5956942078, -38.2074843164), (-57.5959882808, -38.2077605131), (-57.5962823975, -38.2080366633))
        make_face()
        with BuildLine():
            Line((-57.1887633917, -37.7155894586), (-57.1882828592, -37.7154165904))
            Line((-57.1882828592, -37.7154165904), (-57.1883310441, -37.7149081879))
            ThreePointArc((-57.1883310441, -37.7149081879), (-57.1885471909, -37.7152488404), (-57.1887633917, -37.7155894586))
        make_face()
        with BuildLine():
            Line((-56.9165139845, -37.1372675329), (-56.9160915394, -37.136980592))
            Line((-56.9160915394, -37.136980592), (-56.9162646451, -37.1365001451))
            ThreePointArc((-56.9162646451, -37.1365001451), (-56.9163892844, -37.1368838488), (-56.9165139845, -37.1372675329))
        make_face()
        with BuildLine():
            Line((-56.7966406075, -36.5094089795), (-56.7963027937, -36.5090259957))
            Line((-56.7963027937, -36.5090259957), (-56.7965899431, -36.5086036924))
            ThreePointArc((-56.7965899431, -36.5086036924), (-56.7966152435, -36.509006338), (-56.7966406075, -36.5094089795))
        make_face()
        with BuildLine():
            Line((-56.8366753459, -35.8714644606), (-56.8364433893, -35.871009498))
            Line((-56.8364433893, -35.871009498), (-56.83682654, -35.8706718733))
            ThreePointArc((-56.83682654, -35.8706718733), (-56.8367509116, -35.871068161), (-56.8366753459, -35.8714644606))
        make_face()
        with BuildLine():
            Line((-57.0341026698, -35.2635183764), (-57.0339911452, -35.263020022))
            Line((-57.0339911452, -35.263020022), (-57.0344462223, -35.2627882902))
            ThreePointArc((-57.0344462223, -35.2627882902), (-57.0342744172, -35.2631533197), (-57.0341026698, -35.2635183764))
        make_face()
        with BuildLine():
            Line((-57.3765174944, -34.7237702153), (-57.3765334092, -34.7232597825))
            Line((-57.3765334092, -34.7232597825), (-57.3770318186, -34.7231485041))
            ThreePointArc((-57.3770318186, -34.7231485041), (-57.3767746319, -34.7234593393), (-57.3765174944, -34.7237702153))
        make_face()
        with BuildLine():
            Line((-57.8424046368, -34.2861343392), (-57.8425469911, -34.2856439005))
            Line((-57.8425469911, -34.2856439005), (-57.8430574159, -34.2856600675))
            ThreePointArc((-57.8430574159, -34.2856600675), (-57.8427310076, -34.2858971775), (-57.8424046368, -34.2861343392))
        make_face()
        with BuildLine():
            Line((-59.021583401, -33.8190486209), (-59.0219444176, -33.8186874259))
            Line((-59.0219444176, -33.8186874259), (-59.0223839178, -33.8189474921))
            ThreePointArc((-59.0223839178, -33.8189474921), (-59.0219836554, -33.8189980248), (-59.021583401, -33.8190486209))
        make_face()
        with BuildLine():
            Line((-60.2799258899, -33.9778119878), (-60.2804162582, -33.9776693913))
            Line((-60.2804162582, -33.9776693913), (-60.2806761073, -33.9781090199))
            ThreePointArc((-60.2806761073, -33.9781090199), (-60.2803010103, -33.9779604742), (-60.2799258899, -33.9778119878))
        make_face()
        with BuildLine():
            ThreePointArc((-60.8407621651, -34.2861343392), (-60.8404357943, -34.2858971775), (-60.840109386, -34.2856600675))
            Line((-60.840109386, -34.2856600675), (-60.8406198108, -34.2856439005))
            Line((-60.8406198108, -34.2856439005), (-60.8407621651, -34.2861343392))
        make_face()
    extrude(amount=F24_DEPTH)


solid = Compound([f1_1.part, f22.part])
